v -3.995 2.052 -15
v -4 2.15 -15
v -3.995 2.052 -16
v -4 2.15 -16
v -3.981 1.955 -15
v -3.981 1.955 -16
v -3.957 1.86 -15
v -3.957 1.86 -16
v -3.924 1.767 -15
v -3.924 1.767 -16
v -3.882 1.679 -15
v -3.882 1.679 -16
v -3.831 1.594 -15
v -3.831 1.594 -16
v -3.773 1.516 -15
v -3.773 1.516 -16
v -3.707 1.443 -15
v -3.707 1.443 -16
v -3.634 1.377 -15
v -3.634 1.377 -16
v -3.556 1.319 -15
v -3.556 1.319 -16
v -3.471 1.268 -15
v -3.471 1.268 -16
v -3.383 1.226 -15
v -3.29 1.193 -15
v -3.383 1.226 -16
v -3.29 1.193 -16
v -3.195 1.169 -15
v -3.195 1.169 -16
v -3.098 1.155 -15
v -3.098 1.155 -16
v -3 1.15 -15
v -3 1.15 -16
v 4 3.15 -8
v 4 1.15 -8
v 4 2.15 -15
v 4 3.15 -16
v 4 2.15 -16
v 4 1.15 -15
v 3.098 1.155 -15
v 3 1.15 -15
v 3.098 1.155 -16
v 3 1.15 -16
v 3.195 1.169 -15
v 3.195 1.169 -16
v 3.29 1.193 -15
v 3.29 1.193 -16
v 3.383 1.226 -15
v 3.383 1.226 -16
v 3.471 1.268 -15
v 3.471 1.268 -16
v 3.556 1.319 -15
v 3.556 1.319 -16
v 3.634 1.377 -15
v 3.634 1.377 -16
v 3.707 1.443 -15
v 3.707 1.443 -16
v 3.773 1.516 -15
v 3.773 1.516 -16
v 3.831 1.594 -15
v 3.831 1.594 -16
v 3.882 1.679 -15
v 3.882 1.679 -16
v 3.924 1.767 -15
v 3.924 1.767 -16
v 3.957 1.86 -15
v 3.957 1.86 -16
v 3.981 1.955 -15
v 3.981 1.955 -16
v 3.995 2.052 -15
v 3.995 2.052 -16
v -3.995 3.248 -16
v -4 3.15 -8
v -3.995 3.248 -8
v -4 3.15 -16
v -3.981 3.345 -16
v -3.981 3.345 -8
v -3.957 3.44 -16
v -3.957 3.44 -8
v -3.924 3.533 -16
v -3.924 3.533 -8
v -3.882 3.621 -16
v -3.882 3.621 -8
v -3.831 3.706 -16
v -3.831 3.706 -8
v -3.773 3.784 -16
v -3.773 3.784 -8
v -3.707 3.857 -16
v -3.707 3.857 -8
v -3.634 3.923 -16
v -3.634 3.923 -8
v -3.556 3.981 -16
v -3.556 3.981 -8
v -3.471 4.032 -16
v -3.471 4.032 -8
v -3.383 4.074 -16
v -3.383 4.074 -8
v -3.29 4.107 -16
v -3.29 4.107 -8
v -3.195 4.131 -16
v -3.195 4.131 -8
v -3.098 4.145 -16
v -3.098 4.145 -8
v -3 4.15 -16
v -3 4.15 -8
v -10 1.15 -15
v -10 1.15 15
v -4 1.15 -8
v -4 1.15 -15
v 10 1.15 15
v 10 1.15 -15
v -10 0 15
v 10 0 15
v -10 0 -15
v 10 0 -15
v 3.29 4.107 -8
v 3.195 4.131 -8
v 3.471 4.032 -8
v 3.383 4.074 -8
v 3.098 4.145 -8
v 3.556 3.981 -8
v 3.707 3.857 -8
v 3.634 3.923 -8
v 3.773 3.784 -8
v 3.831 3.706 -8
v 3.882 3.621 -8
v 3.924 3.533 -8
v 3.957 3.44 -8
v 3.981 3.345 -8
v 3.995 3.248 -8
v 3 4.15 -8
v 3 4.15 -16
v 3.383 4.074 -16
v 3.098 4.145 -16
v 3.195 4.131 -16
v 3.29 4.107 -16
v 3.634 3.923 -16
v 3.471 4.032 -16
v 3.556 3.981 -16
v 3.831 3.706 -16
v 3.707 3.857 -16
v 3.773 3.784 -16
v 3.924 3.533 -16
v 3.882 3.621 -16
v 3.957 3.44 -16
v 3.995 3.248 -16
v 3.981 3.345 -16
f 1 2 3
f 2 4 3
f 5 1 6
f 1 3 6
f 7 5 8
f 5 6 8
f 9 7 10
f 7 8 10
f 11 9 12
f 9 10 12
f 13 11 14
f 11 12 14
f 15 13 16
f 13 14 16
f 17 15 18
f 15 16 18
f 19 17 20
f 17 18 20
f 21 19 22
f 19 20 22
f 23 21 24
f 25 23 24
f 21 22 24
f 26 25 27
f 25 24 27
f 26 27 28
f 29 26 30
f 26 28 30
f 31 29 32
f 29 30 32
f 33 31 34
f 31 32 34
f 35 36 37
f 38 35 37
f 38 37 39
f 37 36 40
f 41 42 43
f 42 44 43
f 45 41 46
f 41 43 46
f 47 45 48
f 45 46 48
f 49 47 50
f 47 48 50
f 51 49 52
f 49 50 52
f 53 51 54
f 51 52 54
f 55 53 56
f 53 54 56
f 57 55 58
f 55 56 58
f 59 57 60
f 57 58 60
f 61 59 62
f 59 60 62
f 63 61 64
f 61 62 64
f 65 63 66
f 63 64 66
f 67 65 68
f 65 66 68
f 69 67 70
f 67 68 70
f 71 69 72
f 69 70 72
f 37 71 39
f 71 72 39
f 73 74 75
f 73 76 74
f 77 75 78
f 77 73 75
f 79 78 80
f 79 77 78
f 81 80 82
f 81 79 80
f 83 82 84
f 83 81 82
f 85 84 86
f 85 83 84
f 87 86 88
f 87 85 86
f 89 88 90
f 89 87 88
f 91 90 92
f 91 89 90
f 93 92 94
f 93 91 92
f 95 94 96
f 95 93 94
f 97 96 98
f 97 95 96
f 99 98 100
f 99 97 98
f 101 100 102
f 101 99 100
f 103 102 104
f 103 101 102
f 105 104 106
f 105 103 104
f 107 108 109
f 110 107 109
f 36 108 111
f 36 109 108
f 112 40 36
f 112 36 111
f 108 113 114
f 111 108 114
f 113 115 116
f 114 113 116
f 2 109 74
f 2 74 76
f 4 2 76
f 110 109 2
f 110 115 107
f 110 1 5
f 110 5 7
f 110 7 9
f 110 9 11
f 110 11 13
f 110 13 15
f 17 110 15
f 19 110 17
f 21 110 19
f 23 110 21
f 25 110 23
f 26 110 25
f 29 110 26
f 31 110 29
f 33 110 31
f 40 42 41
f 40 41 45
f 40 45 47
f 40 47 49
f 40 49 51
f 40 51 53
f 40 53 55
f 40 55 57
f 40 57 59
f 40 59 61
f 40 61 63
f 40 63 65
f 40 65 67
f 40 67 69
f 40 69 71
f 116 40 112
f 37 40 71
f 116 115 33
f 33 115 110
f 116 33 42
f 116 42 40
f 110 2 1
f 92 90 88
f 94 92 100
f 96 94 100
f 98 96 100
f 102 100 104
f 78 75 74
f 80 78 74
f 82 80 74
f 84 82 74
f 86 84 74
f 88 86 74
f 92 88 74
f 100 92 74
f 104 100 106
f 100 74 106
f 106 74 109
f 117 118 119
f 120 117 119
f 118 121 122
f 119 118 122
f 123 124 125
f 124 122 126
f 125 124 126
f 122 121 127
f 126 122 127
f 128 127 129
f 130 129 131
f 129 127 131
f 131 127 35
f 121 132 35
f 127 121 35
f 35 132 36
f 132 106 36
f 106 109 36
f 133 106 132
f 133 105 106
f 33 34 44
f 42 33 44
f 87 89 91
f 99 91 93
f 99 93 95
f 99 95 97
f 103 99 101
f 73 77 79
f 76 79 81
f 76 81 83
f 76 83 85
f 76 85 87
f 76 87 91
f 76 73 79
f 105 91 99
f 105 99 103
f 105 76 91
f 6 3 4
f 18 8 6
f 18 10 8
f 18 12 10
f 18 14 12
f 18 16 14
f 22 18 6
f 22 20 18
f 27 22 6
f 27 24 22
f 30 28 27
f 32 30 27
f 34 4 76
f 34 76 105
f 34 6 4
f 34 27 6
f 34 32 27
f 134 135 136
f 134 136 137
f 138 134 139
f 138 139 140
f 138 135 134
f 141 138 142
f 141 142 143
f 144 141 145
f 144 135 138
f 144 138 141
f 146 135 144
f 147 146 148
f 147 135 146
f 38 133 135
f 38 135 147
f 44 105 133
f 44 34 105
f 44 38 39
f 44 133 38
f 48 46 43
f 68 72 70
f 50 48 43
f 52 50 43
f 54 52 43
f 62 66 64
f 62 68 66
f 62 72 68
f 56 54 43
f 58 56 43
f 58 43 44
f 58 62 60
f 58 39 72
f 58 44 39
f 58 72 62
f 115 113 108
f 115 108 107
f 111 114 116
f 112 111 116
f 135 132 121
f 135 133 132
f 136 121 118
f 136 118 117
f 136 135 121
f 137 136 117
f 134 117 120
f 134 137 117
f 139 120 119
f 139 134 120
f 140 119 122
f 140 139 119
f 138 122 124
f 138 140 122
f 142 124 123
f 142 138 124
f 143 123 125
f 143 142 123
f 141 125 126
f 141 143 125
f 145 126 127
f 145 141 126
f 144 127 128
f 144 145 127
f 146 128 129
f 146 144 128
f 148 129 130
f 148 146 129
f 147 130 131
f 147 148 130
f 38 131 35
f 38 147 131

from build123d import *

# Parameters (mm, degrees)
CROQUIS1_W              = 20
CROQUIS1_H              = 30
SALIENTE_EXTRUIR1_DEPTH = 1.15
CROQUIS2_W              = 8
CROQUIS2_H              = 8
SALIENTE_EXTRUIR2_DEPTH = 3
REDONDEO1_R             = 1


with BuildPart() as part:
    # Croquis1 → Saliente-Extruir1 (new body)
    with BuildSketch(Plane(origin=(0, 0, 0), x_dir=(1, 0, 0), z_dir=(0, 1, 0))):
        Rectangle(CROQUIS1_W, CROQUIS1_H)
    extrude(amount=SALIENTE_EXTRUIR1_DEPTH)

    # Croquis2 → Saliente-Extruir2 (add)
    with BuildSketch(Plane(origin=(0, 1.15, 0), x_dir=(1, 0, 0), z_dir=(0, 1, 0))):
        with Locations((0, 12)):
            Rectangle(CROQUIS2_W, CROQUIS2_H)
    extrude(amount=SALIENTE_EXTRUIR2_DEPTH)

    # Redondeo1
    redondeo1_edges = [part.edges().sort_by_distance(p)[0] for p in [
        (-4, 1.15, -15.5),
        (4, 1.15, -15.5),
        (-4, 4.15, -12),
        (4, 4.15, -12),
    ]]
    fillet(redondeo1_edges, radius=REDONDEO1_R)


solid = part.part
